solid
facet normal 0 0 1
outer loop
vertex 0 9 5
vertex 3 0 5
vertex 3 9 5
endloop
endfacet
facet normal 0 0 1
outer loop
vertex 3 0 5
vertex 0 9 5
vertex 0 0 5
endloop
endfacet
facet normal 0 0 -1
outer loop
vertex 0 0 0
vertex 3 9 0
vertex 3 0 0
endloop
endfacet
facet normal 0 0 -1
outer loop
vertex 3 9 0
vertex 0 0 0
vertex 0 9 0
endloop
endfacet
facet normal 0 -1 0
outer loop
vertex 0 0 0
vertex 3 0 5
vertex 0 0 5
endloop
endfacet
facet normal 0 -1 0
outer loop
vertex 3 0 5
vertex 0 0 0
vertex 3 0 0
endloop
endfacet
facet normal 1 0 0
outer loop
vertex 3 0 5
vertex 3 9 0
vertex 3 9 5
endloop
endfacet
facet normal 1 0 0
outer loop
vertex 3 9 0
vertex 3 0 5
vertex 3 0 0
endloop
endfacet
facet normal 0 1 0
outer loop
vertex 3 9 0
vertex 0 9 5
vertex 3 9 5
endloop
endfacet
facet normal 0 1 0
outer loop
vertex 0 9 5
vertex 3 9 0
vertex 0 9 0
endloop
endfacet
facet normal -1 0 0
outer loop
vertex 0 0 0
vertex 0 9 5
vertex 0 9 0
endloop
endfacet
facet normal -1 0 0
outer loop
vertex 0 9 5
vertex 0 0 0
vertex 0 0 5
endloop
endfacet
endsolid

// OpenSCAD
// Generated by SolidPython 1.0.1 on 2020-07-29 00:46:54


cube(size = [3, 9, 5]);
/***********************************************
*********      SolidPython code:      **********
************************************************
 
# import packages: SolidPython
from solid import *
from solid.utils import *
from itertools import chain, combinations, permutations


class Resize:

    def __init__(self, scad_file):
        self.scad_file = scad_file
        #self.scad_file = import_scad(scad_file)
        # cone/cylinder param:
        self.r1 = 0
        self.r2 = 0
        self.h = 0
        # rectangular prism param:
        self.w = 0
        self.l = 0
        # ellipse param:
        self.r = 0

    # import OpenScad code (file name corresponds to shape)


    # classify shape + parameters
    def assign(self, param1, param2, param3):
        if self.scad_file == 'cone.scad':
            self.r1 = param1
            self.r2 = param2
            self.h = param3
        elif self.scad_file == 'cylinder.scad':
            self.r1 = param1
            self.r2 = param2
            self.h = param3
        elif self.scad_file == 'rectangularPrism.scad':
            self.h = param1
            self.l = param2
            self.w = param3
        else:
            self.r = param1
            self.h = param2

    # resize parameters
    def iterate(self):
        x = range(3, 20, 2)
        i = 1
        if self.scad_file == 'cone.scad':
            tempList = list(permutations(x, 2))
            for temp in tempList:
                param1 = temp[0]
                param2 = temp[1]
                filepath = 'produced_scad_files/' + 'cone' + str(param1) + '_' + str(param2) + '_' + '.scad'
                scad_render_to_file(cylinder(h=param1, r1=param2, r2=0), filepath)

        elif self.scad_file == 'cylinder.scad':
            tempList = list(permutations(x, 3))
            for temp in tempList:
                param1 = temp[0]
                param2 = temp[1]
                filepath = 'produced_scad_files/' + 'cylinder' + str(param1) + '_' + str(param2) + '_' + '.scad'
                scad_render_to_file(cylinder(h=param1, r1=param2, r2=param2), filepath)

        elif self.scad_file == 'rectangularPrism.scad':
            tempList = list(permutations(x, 3))
            for temp in tempList:
                param1 = temp[0]
                param2 = temp[1]
                param3 = temp[2]
                filepath = 'produced_scad_files/' + 'rectangularPrism' + str(param1) + '_' + str(param2) + '_' + str(
                    param3) + '.scad'
                scad_render_to_file(cube(size=(param1, param2, param3)), filepath)

        elif self.scad_file == 'ellipse.scad':
            tempList = list(permutations(x, 4))
            for temp in tempList:
                param1 = temp[0]
                param2 = temp[1]
                param3 = temp[2]
                param4 = temp[3]
                filepath = 'produced_scad_files/' + 'ellipse' + str(param1) + '_' + str(param2) + '_' + str(param3) + '_' + str(param4) + '.scad'
                scad_render_to_file(scale([param1, param2, param3])(sphere(r=param4)), filepath)

    def render_to_scadfile(self):
        scad_render_to_file(scad, 'example.scad') 
 
************************************************/
